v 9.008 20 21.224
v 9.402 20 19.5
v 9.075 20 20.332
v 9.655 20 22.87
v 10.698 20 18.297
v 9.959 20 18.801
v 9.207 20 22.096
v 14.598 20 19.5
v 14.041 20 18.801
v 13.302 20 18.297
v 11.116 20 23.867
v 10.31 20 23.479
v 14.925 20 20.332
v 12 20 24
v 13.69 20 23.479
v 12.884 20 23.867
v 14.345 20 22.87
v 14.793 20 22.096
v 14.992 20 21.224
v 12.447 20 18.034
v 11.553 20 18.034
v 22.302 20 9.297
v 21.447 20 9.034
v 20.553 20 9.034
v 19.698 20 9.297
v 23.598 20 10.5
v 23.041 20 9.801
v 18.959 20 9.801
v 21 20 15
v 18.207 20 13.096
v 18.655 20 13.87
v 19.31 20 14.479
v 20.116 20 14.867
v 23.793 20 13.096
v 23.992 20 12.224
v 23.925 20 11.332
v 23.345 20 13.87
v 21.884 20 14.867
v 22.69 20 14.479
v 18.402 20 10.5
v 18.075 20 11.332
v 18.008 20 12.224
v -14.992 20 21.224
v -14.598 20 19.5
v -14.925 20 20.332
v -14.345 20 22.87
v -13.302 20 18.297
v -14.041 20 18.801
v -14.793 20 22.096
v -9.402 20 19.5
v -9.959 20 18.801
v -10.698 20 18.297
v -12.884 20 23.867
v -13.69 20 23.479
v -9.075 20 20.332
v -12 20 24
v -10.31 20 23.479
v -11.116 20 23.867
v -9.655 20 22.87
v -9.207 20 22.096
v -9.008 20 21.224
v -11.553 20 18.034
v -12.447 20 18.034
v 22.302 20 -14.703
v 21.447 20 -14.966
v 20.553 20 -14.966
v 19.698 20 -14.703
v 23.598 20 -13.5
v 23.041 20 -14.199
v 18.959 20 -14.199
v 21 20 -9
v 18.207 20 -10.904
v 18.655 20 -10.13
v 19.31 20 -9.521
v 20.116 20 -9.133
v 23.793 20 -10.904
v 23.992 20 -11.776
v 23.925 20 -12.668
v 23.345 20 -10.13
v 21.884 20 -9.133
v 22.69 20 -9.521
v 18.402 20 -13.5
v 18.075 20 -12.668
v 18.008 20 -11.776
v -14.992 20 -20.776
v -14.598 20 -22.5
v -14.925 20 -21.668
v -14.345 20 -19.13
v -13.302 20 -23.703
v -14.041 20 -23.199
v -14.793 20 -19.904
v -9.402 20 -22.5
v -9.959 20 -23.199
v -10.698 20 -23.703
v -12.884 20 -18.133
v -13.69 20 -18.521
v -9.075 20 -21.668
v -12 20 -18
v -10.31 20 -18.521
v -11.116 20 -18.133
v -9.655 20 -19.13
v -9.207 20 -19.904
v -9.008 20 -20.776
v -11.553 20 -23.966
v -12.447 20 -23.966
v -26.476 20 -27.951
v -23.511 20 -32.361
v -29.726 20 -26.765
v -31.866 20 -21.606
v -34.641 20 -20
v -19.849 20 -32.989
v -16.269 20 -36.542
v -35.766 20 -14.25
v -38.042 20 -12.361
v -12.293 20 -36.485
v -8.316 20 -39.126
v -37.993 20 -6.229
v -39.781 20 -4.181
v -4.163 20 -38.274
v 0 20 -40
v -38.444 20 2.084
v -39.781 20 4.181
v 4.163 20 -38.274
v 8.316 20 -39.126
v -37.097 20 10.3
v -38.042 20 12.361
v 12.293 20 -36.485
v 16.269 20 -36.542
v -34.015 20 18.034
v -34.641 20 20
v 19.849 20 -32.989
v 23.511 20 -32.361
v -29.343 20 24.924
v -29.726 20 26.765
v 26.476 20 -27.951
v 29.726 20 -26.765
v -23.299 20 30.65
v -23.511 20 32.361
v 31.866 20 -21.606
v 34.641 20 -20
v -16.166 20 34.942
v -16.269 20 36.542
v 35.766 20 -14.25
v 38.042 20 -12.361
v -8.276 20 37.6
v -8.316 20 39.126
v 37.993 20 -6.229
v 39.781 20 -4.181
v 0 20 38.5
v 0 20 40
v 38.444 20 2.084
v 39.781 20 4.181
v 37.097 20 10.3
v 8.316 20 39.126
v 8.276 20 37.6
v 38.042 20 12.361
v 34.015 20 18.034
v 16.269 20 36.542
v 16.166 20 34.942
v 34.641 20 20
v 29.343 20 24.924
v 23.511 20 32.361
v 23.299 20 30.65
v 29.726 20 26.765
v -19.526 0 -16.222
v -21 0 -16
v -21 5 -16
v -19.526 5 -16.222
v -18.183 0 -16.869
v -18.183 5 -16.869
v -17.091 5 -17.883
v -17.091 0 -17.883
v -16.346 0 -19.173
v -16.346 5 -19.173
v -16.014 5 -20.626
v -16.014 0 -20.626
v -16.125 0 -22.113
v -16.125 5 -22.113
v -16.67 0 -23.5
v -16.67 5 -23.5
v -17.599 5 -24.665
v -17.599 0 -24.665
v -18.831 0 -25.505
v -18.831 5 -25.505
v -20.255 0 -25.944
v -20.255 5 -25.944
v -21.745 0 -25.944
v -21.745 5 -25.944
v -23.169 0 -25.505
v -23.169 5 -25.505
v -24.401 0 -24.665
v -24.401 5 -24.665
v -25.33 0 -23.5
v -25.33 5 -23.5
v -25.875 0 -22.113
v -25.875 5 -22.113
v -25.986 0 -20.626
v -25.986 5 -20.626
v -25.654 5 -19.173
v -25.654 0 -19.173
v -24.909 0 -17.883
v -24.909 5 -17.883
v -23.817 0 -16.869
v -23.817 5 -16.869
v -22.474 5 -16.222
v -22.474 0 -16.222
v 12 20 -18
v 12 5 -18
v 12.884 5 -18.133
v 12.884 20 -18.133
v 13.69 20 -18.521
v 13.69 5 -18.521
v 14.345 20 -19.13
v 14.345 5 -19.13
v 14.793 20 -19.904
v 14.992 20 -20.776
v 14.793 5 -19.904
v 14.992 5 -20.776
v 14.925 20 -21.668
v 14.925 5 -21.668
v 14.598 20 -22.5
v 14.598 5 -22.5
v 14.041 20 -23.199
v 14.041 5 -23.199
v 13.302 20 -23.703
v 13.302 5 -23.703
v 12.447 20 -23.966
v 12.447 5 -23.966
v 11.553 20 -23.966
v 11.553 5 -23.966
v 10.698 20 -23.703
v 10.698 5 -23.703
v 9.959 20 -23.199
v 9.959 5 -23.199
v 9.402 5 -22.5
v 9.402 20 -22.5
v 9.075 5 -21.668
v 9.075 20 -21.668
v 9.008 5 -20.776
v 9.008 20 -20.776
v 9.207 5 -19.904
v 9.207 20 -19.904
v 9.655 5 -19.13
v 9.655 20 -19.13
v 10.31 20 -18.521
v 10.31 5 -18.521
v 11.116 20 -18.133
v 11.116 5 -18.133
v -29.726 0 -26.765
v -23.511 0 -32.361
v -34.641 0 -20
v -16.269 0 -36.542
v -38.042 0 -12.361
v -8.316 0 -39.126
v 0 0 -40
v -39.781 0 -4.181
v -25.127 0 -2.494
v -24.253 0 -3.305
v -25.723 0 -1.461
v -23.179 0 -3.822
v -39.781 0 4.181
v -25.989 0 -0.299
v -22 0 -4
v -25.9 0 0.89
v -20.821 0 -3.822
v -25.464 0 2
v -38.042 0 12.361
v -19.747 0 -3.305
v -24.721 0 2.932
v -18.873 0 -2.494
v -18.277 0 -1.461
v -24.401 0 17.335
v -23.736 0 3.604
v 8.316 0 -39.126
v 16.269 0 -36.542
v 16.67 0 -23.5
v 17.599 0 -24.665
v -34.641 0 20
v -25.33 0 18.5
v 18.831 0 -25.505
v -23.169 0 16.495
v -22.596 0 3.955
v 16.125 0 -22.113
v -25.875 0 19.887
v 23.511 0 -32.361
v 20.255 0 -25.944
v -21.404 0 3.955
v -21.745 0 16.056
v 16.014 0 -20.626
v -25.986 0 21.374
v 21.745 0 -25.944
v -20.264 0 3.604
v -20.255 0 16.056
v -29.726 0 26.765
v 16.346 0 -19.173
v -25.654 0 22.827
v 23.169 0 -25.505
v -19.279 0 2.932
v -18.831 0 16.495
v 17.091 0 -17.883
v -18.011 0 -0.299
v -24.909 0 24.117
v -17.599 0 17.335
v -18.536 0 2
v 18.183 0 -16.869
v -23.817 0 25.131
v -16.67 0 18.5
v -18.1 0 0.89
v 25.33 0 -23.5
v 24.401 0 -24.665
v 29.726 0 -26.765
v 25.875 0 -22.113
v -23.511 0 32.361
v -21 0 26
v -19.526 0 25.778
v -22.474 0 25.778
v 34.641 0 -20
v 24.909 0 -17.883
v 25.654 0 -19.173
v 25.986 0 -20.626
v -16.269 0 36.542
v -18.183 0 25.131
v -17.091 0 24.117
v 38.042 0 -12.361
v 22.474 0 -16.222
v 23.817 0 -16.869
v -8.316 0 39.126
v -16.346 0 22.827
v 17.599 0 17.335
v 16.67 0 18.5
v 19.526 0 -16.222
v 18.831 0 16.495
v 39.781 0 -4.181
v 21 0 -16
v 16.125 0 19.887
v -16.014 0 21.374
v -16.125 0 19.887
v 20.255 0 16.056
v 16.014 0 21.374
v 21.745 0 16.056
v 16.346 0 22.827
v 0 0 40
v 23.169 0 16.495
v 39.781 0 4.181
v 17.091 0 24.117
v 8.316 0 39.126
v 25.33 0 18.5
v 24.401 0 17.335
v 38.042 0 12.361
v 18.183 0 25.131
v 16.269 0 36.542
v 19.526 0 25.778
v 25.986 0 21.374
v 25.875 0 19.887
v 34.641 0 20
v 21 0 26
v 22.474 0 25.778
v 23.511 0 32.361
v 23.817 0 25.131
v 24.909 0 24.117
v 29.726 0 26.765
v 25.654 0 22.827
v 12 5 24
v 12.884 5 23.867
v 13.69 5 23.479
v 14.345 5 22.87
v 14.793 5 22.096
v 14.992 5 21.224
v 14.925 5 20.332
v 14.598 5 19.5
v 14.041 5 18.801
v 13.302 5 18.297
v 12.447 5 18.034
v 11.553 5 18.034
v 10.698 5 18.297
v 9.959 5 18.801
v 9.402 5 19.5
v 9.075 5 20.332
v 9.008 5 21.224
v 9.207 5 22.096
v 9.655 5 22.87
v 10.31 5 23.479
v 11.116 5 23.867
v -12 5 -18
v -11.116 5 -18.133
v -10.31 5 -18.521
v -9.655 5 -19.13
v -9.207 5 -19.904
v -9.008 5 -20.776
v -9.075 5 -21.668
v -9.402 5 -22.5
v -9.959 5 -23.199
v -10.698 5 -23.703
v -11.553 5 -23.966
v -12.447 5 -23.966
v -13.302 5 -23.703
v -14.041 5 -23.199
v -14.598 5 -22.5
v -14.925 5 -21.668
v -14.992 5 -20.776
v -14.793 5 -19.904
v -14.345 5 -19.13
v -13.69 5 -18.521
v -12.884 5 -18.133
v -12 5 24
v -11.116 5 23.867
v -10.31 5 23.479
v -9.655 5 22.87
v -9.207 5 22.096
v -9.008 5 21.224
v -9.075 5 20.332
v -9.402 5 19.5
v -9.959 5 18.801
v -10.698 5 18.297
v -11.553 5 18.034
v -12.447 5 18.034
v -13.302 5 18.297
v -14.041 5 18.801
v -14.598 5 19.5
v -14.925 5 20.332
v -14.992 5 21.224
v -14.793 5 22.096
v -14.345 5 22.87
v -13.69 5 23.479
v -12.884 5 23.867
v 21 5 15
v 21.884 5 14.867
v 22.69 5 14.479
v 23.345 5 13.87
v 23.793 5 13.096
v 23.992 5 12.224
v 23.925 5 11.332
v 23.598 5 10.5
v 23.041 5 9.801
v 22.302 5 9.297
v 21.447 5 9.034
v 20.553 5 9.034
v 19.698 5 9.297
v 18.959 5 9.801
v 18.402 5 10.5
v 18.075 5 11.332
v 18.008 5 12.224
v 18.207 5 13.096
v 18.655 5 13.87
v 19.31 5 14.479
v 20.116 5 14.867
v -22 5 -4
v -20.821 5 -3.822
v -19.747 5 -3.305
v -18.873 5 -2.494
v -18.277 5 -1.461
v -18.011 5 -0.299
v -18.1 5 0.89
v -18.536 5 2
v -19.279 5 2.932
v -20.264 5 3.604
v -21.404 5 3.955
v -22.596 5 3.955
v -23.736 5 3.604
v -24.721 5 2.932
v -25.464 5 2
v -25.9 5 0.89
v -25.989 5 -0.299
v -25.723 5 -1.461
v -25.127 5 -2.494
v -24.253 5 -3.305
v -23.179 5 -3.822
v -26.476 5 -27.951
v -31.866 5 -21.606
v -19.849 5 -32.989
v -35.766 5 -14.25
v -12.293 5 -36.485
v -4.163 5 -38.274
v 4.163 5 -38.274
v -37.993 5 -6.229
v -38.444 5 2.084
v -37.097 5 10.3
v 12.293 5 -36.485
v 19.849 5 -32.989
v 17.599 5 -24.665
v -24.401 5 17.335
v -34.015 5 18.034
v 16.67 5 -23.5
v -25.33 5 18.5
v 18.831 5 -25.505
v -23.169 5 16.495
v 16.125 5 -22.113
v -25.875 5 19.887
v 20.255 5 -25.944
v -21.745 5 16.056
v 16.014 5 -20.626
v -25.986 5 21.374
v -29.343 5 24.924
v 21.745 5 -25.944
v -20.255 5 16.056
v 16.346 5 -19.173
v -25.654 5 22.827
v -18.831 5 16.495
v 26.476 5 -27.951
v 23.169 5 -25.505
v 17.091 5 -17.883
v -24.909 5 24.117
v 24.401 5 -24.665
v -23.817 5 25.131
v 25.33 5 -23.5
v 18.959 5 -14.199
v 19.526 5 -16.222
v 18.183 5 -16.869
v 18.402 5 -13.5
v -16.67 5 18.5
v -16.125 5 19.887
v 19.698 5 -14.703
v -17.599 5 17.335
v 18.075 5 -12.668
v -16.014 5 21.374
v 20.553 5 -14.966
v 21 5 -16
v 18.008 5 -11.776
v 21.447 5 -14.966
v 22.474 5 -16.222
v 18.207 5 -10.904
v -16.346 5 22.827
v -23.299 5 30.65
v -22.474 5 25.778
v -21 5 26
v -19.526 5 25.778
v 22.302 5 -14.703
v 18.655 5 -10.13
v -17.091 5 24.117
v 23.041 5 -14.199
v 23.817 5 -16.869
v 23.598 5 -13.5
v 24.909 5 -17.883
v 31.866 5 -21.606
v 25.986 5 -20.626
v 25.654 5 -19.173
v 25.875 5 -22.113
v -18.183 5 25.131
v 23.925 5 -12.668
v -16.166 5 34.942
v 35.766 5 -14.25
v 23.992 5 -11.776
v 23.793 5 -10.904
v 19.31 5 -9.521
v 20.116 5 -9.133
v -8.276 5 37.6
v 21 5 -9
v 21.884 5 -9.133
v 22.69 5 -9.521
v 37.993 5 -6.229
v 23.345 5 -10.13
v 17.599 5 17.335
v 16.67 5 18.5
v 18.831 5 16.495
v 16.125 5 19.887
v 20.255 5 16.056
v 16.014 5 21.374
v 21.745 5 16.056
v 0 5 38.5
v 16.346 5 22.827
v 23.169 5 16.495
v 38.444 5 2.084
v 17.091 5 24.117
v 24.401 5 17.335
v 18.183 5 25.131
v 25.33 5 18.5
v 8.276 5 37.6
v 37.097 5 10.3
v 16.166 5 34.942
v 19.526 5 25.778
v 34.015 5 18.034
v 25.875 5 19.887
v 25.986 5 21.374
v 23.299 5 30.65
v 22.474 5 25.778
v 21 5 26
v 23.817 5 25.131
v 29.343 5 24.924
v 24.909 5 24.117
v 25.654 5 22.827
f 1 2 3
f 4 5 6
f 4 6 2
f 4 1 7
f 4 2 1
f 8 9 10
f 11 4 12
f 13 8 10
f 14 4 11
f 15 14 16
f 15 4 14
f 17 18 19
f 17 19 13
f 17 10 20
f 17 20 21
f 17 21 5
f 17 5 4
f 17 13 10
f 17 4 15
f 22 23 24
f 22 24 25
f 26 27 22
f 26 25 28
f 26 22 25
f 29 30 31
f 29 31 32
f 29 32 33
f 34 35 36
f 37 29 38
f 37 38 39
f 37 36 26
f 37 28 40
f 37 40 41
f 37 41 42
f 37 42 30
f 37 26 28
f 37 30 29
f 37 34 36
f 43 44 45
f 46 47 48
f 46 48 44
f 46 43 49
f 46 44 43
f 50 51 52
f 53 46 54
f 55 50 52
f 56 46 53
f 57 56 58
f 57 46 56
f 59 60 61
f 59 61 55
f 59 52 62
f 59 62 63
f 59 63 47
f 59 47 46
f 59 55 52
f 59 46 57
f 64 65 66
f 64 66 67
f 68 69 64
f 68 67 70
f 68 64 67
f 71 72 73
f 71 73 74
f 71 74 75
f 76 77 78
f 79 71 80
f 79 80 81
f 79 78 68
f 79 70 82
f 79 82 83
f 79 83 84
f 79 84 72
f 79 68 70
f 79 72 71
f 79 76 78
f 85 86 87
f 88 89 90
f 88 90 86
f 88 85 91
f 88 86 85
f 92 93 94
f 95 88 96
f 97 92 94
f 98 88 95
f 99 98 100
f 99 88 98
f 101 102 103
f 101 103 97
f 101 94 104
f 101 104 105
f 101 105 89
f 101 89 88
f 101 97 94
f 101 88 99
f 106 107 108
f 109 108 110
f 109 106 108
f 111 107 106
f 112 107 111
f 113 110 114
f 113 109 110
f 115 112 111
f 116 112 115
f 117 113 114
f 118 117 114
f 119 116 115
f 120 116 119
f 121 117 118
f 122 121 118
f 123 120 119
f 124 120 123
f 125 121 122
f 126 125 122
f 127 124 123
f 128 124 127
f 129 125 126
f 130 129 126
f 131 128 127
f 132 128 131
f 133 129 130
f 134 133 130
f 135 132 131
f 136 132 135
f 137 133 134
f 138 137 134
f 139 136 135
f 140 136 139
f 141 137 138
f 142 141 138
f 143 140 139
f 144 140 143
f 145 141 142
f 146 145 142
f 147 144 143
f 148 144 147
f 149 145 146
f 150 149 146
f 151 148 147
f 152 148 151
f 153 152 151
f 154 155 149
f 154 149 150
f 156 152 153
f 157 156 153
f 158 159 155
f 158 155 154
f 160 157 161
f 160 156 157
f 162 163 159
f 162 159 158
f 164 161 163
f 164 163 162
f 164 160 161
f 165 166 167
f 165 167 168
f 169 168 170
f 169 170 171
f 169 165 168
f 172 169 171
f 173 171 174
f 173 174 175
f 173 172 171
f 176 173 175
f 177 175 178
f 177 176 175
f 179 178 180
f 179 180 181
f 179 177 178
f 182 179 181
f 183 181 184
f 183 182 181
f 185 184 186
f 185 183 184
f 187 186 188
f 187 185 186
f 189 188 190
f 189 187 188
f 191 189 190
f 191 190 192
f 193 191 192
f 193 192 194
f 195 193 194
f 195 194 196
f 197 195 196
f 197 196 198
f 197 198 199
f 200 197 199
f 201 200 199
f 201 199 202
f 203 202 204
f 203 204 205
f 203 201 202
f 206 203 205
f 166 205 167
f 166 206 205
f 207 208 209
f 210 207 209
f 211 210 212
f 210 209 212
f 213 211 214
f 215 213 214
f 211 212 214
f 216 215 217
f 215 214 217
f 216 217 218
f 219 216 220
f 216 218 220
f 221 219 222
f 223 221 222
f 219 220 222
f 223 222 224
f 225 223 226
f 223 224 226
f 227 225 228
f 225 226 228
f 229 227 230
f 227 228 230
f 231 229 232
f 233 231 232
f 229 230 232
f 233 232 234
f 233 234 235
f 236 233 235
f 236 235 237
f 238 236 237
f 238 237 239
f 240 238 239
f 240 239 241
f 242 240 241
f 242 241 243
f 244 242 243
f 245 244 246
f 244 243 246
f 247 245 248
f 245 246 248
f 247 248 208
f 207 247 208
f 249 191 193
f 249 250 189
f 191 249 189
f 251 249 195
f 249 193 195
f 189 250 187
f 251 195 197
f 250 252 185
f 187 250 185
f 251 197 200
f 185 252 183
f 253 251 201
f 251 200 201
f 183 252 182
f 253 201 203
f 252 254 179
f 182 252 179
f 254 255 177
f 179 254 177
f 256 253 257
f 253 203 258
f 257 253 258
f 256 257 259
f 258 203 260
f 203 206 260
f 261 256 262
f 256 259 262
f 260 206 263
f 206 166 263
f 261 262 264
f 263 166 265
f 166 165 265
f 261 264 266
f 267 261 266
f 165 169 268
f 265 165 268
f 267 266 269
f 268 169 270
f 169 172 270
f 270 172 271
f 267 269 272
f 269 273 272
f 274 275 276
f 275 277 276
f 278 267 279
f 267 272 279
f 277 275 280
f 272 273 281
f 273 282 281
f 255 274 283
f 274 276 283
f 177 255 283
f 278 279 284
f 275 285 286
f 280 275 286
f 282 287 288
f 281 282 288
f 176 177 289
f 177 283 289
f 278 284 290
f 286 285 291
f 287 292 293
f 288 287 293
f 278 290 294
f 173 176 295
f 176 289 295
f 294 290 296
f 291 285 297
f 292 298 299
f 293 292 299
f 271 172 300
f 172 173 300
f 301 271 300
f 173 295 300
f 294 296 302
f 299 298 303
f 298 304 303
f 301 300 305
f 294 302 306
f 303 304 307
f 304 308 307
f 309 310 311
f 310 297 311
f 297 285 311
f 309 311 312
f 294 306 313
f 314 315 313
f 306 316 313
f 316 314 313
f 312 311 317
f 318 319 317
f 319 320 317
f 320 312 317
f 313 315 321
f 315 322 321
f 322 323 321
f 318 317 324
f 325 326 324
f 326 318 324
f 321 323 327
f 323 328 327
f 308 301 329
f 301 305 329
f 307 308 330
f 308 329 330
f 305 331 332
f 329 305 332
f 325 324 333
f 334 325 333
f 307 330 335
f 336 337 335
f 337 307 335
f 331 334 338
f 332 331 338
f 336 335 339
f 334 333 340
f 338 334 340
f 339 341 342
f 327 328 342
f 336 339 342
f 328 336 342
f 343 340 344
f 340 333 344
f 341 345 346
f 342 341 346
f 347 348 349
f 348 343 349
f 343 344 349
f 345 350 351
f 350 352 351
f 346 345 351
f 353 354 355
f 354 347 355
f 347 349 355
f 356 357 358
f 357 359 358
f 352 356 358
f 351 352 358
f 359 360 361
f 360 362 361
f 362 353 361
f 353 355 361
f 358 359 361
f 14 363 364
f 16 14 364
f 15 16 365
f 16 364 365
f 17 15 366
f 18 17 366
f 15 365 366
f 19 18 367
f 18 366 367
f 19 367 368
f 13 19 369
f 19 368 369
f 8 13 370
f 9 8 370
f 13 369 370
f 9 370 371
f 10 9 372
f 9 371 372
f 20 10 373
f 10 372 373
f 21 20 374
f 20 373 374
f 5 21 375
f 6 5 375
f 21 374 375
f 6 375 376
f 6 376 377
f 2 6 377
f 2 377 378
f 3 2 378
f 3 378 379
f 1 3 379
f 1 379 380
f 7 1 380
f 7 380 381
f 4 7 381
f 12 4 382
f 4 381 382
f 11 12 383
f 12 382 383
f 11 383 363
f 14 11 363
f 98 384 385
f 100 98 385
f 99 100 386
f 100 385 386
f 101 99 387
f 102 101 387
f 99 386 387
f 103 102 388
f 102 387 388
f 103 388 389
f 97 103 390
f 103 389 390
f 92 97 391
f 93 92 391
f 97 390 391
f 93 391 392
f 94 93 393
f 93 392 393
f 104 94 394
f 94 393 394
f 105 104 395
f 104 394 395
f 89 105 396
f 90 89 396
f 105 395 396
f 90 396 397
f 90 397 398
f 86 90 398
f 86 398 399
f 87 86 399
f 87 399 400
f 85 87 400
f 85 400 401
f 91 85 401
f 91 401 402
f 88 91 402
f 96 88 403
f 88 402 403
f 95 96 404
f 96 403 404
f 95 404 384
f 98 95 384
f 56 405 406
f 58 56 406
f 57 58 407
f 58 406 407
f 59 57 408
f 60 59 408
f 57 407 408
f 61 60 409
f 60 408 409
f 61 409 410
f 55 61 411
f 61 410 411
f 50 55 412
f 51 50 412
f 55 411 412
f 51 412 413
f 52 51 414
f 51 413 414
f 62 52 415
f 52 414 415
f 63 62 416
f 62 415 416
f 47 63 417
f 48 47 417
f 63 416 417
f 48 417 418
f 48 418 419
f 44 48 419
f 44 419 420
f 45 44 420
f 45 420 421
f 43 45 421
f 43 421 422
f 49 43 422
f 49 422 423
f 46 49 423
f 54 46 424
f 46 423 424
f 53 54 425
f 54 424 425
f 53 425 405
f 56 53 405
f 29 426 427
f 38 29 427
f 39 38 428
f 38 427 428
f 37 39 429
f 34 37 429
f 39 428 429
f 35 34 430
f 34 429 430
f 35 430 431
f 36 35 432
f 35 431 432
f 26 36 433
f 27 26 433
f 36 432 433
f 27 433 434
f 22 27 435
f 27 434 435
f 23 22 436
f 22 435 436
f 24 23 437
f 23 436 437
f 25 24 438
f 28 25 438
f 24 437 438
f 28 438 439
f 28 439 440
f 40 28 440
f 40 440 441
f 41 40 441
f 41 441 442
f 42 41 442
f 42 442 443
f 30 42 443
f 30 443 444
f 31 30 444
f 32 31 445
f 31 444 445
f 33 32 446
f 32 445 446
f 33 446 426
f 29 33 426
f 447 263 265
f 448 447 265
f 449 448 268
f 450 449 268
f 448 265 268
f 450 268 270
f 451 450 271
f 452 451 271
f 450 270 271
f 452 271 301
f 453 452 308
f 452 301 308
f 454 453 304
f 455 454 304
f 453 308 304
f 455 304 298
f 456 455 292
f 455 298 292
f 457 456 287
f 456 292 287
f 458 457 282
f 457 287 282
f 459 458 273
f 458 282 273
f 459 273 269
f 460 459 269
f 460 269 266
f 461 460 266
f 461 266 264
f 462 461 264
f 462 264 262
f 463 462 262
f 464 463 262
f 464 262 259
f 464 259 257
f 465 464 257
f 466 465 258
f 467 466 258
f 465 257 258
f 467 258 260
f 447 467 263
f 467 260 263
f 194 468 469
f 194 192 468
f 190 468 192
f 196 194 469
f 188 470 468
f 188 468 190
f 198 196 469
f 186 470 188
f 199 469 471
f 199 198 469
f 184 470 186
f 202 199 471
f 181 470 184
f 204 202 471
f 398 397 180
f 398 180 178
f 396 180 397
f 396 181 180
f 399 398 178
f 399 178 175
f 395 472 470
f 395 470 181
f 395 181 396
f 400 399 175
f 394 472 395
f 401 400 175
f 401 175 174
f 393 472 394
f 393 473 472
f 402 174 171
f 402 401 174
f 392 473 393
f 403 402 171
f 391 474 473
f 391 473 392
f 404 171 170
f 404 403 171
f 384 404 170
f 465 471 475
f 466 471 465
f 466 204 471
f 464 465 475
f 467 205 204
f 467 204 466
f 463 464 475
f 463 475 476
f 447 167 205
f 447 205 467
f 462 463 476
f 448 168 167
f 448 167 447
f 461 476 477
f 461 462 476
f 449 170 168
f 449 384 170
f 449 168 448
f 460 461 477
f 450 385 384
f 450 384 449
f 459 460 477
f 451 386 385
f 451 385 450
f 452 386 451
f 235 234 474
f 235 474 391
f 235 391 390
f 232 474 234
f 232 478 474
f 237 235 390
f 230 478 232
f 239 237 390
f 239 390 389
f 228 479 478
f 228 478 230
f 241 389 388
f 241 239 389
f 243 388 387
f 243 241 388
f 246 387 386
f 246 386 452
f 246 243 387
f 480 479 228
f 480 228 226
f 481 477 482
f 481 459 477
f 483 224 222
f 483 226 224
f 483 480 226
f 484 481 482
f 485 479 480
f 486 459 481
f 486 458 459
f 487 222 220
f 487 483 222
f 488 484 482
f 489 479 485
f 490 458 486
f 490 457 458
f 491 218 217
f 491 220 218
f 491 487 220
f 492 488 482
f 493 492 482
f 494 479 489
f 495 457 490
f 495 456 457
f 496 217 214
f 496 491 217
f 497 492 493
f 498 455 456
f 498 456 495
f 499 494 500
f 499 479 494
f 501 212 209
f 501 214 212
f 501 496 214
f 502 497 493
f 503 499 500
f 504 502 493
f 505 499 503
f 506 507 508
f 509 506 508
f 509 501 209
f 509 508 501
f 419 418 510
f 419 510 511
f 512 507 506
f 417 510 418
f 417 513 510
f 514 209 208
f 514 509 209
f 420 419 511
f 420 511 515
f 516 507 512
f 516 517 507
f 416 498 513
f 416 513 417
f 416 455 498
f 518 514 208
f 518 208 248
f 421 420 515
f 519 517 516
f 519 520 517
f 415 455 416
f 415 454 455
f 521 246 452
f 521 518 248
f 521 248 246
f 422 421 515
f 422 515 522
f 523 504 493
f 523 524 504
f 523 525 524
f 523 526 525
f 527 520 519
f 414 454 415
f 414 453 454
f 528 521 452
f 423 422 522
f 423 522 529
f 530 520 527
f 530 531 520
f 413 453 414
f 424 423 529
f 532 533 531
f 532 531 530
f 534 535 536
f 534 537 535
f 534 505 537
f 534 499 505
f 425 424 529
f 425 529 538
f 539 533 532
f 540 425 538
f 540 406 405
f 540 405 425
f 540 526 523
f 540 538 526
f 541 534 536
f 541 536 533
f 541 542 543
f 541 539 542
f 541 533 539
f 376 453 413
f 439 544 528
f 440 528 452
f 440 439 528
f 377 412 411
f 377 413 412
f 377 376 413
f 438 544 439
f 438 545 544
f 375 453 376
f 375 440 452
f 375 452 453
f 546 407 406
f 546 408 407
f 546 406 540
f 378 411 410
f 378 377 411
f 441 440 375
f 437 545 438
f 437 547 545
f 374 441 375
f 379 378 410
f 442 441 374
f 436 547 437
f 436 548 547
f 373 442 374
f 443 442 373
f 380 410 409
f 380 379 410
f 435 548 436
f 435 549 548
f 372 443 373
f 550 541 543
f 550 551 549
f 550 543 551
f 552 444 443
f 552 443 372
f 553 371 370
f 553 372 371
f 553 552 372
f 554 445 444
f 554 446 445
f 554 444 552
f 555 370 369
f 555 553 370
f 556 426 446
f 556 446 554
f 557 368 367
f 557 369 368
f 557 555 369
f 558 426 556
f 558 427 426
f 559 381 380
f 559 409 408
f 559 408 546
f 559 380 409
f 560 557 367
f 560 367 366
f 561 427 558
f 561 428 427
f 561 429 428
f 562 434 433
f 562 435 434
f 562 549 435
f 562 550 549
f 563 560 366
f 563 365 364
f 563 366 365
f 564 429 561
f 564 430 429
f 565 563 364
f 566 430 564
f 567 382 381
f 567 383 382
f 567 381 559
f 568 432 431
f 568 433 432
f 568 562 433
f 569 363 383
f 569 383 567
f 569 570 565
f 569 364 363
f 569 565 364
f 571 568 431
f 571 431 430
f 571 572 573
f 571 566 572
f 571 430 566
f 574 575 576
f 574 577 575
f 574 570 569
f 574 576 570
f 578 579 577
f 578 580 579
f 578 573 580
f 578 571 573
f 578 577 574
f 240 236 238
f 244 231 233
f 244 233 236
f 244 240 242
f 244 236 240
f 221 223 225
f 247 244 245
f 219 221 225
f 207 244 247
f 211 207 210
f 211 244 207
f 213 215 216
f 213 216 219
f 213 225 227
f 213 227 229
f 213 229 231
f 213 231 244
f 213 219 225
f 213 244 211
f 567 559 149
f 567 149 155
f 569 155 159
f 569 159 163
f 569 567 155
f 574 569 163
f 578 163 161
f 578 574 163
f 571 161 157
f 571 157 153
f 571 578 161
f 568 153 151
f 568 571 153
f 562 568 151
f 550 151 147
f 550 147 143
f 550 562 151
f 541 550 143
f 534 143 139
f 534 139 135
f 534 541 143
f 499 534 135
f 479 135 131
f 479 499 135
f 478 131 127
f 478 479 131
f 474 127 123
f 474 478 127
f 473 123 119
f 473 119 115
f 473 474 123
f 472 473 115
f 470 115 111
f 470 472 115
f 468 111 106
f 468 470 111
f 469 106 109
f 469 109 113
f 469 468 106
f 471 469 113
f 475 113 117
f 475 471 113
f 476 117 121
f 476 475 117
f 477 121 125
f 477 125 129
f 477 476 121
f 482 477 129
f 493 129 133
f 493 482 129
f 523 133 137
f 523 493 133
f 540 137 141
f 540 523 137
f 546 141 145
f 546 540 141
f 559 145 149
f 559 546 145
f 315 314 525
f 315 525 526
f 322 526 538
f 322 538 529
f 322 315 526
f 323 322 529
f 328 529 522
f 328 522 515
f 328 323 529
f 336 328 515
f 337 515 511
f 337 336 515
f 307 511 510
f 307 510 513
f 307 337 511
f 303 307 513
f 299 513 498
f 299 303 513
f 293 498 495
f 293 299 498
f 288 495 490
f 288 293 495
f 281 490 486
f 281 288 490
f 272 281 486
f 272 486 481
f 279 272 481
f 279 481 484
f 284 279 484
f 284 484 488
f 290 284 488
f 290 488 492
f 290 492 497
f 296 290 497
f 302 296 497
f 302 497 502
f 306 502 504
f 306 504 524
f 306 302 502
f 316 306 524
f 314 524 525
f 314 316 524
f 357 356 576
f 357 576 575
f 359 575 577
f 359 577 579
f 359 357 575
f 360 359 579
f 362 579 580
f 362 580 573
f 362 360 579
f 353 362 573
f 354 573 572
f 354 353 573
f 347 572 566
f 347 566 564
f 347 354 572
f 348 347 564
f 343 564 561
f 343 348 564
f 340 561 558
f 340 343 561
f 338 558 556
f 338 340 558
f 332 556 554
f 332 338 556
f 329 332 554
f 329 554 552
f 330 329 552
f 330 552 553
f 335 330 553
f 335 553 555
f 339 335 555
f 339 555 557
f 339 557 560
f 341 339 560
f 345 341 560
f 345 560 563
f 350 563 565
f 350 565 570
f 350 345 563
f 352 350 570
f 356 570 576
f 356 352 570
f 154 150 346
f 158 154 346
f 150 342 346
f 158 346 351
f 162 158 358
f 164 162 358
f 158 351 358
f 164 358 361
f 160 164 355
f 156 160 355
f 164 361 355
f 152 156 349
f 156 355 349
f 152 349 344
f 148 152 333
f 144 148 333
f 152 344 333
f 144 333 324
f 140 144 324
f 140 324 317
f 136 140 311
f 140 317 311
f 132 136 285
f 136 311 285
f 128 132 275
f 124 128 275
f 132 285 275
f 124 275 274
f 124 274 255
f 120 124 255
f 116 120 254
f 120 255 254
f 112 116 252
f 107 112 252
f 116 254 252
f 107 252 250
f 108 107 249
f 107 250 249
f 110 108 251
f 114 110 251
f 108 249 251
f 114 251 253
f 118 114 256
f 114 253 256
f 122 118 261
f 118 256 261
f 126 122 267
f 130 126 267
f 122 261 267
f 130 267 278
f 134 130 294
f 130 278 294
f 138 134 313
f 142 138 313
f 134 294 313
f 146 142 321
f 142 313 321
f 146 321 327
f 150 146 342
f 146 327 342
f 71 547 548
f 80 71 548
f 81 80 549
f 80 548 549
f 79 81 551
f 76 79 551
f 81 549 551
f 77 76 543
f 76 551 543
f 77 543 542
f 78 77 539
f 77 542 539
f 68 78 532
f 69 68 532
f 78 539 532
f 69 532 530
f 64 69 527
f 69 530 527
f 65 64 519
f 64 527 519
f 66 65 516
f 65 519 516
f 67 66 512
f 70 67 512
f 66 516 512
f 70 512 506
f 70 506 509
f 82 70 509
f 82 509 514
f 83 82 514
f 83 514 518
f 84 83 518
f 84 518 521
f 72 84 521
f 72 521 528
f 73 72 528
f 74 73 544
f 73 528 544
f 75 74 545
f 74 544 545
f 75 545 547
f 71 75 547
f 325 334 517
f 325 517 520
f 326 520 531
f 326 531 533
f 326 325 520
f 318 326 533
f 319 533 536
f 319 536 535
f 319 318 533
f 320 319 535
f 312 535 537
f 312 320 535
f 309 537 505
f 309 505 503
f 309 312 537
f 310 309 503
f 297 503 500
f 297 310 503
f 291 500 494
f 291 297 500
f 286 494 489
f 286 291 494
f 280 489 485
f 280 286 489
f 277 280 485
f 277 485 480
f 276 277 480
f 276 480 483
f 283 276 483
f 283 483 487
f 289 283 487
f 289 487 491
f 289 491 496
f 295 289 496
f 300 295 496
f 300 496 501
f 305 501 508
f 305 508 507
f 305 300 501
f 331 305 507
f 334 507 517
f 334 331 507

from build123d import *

# Parameters (mm, degrees)
SKETCH1_R           = 40
SKETCH1_R_2         = 5
BOSS_EXTRUDE1_DEPTH = 5
SKETCH2_R           = 40
SKETCH2_R_2         = 38.5
SKETCH2_R_3         = 3
BOSS_EXTRUDE2_DEPTH = 15
SKETCH5_R           = 4
CUT_EXTRUDE1_DEPTH  = 5


with BuildPart() as part:
    # Sketch1 → Boss-Extrude1 (new body)
    with BuildSketch(Plane(origin=(0, 0, 0), x_dir=(1, 0, 0), z_dir=(0, 1, 0))):
        with Locations(Location((0, 0, 0), (0, 0, 270))):
            Circle(SKETCH1_R)
        with Locations(Location((-21, 21, 0), (0, 0, 270))):
            Circle(SKETCH1_R_2, mode=Mode.SUBTRACT)
        with Locations(Location((-21, -21, 0), (0, 0, 270))):
            Circle(SKETCH1_R_2, mode=Mode.SUBTRACT)
        with Locations(Location((21, -21, 0), (0, 0, 270))):
            Circle(SKETCH1_R_2, mode=Mode.SUBTRACT)
        with Locations(Location((21, 21, 0), (0, 0, 270))):
            Circle(SKETCH1_R_2, mode=Mode.SUBTRACT)
    extrude(amount=BOSS_EXTRUDE1_DEPTH)

    # Sketch2 → Boss-Extrude2 (add)
    # profile 1 of 7: a face of its own
    with BuildSketch(Plane(origin=(0, 5, 0), x_dir=(1, 0, 0), z_dir=(0, 1, 0))):
        with Locations(Location((0, 0, 0), (0, 0, 270))):
            Circle(SKETCH2_R)
        with Locations(Location((0, 0, 0), (0, 0, 270))):
            Circle(SKETCH2_R_2, mode=Mode.SUBTRACT)
    # profile 2 of 7: a face of its own
    with BuildSketch(Plane(origin=(0, 5, 0), x_dir=(1, 0, 0), z_dir=(0, 1, 0))):
        with Locations(Location((-12, -21, 0), (0, 0, 270))):
            Circle(SKETCH2_R_3)
    # profile 3 of 7: a face of its own
    with BuildSketch(Plane(origin=(0, 5, 0), x_dir=(1, 0, 0), z_dir=(0, 1, 0))):
        with Locations(Location((12, -21, 0), (0, 0, 270))):
            Circle(SKETCH2_R_3)
    # profile 4 of 7: a face of its own
    with BuildSketch(Plane(origin=(0, 5, 0), x_dir=(1, 0, 0), z_dir=(0, 1, 0))):
        with Locations(Location((21, -12, 0), (0, 0, 270))):
            Circle(SKETCH2_R_3)
    # profile 5 of 7: a face of its own
    with BuildSketch(Plane(origin=(0, 5, 0), x_dir=(1, 0, 0), z_dir=(0, 1, 0))):
        with Locations(Location((21, 12, 0), (0, 0, 270))):
            Circle(SKETCH2_R_3)
    # profile 6 of 7: a face of its own
    with BuildSketch(Plane(origin=(0, 5, 0), x_dir=(1, 0, 0), z_dir=(0, 1, 0))):
        with Locations(Location((12, 21, 0), (0, 0, 270))):
            Circle(SKETCH2_R_3)
    # profile 7 of 7: a face of its own
    with BuildSketch(Plane(origin=(0, 5, 0), x_dir=(1, 0, 0), z_dir=(0, 1, 0))):
        with Locations(Location((-12, 21, 0), (0, 0, 270))):
            Circle(SKETCH2_R_3)
    extrude(amount=BOSS_EXTRUDE2_DEPTH)

    # Sketch5 → Cut-Extrude1 (cut)
    with BuildSketch(Plane.XZ):
        with Locations(Location((-22, 0, 0), (0, 0, 270))):
            Circle(SKETCH5_R)
    extrude(amount=-CUT_EXTRUDE1_DEPTH, mode=Mode.SUBTRACT)


solid = part.part
